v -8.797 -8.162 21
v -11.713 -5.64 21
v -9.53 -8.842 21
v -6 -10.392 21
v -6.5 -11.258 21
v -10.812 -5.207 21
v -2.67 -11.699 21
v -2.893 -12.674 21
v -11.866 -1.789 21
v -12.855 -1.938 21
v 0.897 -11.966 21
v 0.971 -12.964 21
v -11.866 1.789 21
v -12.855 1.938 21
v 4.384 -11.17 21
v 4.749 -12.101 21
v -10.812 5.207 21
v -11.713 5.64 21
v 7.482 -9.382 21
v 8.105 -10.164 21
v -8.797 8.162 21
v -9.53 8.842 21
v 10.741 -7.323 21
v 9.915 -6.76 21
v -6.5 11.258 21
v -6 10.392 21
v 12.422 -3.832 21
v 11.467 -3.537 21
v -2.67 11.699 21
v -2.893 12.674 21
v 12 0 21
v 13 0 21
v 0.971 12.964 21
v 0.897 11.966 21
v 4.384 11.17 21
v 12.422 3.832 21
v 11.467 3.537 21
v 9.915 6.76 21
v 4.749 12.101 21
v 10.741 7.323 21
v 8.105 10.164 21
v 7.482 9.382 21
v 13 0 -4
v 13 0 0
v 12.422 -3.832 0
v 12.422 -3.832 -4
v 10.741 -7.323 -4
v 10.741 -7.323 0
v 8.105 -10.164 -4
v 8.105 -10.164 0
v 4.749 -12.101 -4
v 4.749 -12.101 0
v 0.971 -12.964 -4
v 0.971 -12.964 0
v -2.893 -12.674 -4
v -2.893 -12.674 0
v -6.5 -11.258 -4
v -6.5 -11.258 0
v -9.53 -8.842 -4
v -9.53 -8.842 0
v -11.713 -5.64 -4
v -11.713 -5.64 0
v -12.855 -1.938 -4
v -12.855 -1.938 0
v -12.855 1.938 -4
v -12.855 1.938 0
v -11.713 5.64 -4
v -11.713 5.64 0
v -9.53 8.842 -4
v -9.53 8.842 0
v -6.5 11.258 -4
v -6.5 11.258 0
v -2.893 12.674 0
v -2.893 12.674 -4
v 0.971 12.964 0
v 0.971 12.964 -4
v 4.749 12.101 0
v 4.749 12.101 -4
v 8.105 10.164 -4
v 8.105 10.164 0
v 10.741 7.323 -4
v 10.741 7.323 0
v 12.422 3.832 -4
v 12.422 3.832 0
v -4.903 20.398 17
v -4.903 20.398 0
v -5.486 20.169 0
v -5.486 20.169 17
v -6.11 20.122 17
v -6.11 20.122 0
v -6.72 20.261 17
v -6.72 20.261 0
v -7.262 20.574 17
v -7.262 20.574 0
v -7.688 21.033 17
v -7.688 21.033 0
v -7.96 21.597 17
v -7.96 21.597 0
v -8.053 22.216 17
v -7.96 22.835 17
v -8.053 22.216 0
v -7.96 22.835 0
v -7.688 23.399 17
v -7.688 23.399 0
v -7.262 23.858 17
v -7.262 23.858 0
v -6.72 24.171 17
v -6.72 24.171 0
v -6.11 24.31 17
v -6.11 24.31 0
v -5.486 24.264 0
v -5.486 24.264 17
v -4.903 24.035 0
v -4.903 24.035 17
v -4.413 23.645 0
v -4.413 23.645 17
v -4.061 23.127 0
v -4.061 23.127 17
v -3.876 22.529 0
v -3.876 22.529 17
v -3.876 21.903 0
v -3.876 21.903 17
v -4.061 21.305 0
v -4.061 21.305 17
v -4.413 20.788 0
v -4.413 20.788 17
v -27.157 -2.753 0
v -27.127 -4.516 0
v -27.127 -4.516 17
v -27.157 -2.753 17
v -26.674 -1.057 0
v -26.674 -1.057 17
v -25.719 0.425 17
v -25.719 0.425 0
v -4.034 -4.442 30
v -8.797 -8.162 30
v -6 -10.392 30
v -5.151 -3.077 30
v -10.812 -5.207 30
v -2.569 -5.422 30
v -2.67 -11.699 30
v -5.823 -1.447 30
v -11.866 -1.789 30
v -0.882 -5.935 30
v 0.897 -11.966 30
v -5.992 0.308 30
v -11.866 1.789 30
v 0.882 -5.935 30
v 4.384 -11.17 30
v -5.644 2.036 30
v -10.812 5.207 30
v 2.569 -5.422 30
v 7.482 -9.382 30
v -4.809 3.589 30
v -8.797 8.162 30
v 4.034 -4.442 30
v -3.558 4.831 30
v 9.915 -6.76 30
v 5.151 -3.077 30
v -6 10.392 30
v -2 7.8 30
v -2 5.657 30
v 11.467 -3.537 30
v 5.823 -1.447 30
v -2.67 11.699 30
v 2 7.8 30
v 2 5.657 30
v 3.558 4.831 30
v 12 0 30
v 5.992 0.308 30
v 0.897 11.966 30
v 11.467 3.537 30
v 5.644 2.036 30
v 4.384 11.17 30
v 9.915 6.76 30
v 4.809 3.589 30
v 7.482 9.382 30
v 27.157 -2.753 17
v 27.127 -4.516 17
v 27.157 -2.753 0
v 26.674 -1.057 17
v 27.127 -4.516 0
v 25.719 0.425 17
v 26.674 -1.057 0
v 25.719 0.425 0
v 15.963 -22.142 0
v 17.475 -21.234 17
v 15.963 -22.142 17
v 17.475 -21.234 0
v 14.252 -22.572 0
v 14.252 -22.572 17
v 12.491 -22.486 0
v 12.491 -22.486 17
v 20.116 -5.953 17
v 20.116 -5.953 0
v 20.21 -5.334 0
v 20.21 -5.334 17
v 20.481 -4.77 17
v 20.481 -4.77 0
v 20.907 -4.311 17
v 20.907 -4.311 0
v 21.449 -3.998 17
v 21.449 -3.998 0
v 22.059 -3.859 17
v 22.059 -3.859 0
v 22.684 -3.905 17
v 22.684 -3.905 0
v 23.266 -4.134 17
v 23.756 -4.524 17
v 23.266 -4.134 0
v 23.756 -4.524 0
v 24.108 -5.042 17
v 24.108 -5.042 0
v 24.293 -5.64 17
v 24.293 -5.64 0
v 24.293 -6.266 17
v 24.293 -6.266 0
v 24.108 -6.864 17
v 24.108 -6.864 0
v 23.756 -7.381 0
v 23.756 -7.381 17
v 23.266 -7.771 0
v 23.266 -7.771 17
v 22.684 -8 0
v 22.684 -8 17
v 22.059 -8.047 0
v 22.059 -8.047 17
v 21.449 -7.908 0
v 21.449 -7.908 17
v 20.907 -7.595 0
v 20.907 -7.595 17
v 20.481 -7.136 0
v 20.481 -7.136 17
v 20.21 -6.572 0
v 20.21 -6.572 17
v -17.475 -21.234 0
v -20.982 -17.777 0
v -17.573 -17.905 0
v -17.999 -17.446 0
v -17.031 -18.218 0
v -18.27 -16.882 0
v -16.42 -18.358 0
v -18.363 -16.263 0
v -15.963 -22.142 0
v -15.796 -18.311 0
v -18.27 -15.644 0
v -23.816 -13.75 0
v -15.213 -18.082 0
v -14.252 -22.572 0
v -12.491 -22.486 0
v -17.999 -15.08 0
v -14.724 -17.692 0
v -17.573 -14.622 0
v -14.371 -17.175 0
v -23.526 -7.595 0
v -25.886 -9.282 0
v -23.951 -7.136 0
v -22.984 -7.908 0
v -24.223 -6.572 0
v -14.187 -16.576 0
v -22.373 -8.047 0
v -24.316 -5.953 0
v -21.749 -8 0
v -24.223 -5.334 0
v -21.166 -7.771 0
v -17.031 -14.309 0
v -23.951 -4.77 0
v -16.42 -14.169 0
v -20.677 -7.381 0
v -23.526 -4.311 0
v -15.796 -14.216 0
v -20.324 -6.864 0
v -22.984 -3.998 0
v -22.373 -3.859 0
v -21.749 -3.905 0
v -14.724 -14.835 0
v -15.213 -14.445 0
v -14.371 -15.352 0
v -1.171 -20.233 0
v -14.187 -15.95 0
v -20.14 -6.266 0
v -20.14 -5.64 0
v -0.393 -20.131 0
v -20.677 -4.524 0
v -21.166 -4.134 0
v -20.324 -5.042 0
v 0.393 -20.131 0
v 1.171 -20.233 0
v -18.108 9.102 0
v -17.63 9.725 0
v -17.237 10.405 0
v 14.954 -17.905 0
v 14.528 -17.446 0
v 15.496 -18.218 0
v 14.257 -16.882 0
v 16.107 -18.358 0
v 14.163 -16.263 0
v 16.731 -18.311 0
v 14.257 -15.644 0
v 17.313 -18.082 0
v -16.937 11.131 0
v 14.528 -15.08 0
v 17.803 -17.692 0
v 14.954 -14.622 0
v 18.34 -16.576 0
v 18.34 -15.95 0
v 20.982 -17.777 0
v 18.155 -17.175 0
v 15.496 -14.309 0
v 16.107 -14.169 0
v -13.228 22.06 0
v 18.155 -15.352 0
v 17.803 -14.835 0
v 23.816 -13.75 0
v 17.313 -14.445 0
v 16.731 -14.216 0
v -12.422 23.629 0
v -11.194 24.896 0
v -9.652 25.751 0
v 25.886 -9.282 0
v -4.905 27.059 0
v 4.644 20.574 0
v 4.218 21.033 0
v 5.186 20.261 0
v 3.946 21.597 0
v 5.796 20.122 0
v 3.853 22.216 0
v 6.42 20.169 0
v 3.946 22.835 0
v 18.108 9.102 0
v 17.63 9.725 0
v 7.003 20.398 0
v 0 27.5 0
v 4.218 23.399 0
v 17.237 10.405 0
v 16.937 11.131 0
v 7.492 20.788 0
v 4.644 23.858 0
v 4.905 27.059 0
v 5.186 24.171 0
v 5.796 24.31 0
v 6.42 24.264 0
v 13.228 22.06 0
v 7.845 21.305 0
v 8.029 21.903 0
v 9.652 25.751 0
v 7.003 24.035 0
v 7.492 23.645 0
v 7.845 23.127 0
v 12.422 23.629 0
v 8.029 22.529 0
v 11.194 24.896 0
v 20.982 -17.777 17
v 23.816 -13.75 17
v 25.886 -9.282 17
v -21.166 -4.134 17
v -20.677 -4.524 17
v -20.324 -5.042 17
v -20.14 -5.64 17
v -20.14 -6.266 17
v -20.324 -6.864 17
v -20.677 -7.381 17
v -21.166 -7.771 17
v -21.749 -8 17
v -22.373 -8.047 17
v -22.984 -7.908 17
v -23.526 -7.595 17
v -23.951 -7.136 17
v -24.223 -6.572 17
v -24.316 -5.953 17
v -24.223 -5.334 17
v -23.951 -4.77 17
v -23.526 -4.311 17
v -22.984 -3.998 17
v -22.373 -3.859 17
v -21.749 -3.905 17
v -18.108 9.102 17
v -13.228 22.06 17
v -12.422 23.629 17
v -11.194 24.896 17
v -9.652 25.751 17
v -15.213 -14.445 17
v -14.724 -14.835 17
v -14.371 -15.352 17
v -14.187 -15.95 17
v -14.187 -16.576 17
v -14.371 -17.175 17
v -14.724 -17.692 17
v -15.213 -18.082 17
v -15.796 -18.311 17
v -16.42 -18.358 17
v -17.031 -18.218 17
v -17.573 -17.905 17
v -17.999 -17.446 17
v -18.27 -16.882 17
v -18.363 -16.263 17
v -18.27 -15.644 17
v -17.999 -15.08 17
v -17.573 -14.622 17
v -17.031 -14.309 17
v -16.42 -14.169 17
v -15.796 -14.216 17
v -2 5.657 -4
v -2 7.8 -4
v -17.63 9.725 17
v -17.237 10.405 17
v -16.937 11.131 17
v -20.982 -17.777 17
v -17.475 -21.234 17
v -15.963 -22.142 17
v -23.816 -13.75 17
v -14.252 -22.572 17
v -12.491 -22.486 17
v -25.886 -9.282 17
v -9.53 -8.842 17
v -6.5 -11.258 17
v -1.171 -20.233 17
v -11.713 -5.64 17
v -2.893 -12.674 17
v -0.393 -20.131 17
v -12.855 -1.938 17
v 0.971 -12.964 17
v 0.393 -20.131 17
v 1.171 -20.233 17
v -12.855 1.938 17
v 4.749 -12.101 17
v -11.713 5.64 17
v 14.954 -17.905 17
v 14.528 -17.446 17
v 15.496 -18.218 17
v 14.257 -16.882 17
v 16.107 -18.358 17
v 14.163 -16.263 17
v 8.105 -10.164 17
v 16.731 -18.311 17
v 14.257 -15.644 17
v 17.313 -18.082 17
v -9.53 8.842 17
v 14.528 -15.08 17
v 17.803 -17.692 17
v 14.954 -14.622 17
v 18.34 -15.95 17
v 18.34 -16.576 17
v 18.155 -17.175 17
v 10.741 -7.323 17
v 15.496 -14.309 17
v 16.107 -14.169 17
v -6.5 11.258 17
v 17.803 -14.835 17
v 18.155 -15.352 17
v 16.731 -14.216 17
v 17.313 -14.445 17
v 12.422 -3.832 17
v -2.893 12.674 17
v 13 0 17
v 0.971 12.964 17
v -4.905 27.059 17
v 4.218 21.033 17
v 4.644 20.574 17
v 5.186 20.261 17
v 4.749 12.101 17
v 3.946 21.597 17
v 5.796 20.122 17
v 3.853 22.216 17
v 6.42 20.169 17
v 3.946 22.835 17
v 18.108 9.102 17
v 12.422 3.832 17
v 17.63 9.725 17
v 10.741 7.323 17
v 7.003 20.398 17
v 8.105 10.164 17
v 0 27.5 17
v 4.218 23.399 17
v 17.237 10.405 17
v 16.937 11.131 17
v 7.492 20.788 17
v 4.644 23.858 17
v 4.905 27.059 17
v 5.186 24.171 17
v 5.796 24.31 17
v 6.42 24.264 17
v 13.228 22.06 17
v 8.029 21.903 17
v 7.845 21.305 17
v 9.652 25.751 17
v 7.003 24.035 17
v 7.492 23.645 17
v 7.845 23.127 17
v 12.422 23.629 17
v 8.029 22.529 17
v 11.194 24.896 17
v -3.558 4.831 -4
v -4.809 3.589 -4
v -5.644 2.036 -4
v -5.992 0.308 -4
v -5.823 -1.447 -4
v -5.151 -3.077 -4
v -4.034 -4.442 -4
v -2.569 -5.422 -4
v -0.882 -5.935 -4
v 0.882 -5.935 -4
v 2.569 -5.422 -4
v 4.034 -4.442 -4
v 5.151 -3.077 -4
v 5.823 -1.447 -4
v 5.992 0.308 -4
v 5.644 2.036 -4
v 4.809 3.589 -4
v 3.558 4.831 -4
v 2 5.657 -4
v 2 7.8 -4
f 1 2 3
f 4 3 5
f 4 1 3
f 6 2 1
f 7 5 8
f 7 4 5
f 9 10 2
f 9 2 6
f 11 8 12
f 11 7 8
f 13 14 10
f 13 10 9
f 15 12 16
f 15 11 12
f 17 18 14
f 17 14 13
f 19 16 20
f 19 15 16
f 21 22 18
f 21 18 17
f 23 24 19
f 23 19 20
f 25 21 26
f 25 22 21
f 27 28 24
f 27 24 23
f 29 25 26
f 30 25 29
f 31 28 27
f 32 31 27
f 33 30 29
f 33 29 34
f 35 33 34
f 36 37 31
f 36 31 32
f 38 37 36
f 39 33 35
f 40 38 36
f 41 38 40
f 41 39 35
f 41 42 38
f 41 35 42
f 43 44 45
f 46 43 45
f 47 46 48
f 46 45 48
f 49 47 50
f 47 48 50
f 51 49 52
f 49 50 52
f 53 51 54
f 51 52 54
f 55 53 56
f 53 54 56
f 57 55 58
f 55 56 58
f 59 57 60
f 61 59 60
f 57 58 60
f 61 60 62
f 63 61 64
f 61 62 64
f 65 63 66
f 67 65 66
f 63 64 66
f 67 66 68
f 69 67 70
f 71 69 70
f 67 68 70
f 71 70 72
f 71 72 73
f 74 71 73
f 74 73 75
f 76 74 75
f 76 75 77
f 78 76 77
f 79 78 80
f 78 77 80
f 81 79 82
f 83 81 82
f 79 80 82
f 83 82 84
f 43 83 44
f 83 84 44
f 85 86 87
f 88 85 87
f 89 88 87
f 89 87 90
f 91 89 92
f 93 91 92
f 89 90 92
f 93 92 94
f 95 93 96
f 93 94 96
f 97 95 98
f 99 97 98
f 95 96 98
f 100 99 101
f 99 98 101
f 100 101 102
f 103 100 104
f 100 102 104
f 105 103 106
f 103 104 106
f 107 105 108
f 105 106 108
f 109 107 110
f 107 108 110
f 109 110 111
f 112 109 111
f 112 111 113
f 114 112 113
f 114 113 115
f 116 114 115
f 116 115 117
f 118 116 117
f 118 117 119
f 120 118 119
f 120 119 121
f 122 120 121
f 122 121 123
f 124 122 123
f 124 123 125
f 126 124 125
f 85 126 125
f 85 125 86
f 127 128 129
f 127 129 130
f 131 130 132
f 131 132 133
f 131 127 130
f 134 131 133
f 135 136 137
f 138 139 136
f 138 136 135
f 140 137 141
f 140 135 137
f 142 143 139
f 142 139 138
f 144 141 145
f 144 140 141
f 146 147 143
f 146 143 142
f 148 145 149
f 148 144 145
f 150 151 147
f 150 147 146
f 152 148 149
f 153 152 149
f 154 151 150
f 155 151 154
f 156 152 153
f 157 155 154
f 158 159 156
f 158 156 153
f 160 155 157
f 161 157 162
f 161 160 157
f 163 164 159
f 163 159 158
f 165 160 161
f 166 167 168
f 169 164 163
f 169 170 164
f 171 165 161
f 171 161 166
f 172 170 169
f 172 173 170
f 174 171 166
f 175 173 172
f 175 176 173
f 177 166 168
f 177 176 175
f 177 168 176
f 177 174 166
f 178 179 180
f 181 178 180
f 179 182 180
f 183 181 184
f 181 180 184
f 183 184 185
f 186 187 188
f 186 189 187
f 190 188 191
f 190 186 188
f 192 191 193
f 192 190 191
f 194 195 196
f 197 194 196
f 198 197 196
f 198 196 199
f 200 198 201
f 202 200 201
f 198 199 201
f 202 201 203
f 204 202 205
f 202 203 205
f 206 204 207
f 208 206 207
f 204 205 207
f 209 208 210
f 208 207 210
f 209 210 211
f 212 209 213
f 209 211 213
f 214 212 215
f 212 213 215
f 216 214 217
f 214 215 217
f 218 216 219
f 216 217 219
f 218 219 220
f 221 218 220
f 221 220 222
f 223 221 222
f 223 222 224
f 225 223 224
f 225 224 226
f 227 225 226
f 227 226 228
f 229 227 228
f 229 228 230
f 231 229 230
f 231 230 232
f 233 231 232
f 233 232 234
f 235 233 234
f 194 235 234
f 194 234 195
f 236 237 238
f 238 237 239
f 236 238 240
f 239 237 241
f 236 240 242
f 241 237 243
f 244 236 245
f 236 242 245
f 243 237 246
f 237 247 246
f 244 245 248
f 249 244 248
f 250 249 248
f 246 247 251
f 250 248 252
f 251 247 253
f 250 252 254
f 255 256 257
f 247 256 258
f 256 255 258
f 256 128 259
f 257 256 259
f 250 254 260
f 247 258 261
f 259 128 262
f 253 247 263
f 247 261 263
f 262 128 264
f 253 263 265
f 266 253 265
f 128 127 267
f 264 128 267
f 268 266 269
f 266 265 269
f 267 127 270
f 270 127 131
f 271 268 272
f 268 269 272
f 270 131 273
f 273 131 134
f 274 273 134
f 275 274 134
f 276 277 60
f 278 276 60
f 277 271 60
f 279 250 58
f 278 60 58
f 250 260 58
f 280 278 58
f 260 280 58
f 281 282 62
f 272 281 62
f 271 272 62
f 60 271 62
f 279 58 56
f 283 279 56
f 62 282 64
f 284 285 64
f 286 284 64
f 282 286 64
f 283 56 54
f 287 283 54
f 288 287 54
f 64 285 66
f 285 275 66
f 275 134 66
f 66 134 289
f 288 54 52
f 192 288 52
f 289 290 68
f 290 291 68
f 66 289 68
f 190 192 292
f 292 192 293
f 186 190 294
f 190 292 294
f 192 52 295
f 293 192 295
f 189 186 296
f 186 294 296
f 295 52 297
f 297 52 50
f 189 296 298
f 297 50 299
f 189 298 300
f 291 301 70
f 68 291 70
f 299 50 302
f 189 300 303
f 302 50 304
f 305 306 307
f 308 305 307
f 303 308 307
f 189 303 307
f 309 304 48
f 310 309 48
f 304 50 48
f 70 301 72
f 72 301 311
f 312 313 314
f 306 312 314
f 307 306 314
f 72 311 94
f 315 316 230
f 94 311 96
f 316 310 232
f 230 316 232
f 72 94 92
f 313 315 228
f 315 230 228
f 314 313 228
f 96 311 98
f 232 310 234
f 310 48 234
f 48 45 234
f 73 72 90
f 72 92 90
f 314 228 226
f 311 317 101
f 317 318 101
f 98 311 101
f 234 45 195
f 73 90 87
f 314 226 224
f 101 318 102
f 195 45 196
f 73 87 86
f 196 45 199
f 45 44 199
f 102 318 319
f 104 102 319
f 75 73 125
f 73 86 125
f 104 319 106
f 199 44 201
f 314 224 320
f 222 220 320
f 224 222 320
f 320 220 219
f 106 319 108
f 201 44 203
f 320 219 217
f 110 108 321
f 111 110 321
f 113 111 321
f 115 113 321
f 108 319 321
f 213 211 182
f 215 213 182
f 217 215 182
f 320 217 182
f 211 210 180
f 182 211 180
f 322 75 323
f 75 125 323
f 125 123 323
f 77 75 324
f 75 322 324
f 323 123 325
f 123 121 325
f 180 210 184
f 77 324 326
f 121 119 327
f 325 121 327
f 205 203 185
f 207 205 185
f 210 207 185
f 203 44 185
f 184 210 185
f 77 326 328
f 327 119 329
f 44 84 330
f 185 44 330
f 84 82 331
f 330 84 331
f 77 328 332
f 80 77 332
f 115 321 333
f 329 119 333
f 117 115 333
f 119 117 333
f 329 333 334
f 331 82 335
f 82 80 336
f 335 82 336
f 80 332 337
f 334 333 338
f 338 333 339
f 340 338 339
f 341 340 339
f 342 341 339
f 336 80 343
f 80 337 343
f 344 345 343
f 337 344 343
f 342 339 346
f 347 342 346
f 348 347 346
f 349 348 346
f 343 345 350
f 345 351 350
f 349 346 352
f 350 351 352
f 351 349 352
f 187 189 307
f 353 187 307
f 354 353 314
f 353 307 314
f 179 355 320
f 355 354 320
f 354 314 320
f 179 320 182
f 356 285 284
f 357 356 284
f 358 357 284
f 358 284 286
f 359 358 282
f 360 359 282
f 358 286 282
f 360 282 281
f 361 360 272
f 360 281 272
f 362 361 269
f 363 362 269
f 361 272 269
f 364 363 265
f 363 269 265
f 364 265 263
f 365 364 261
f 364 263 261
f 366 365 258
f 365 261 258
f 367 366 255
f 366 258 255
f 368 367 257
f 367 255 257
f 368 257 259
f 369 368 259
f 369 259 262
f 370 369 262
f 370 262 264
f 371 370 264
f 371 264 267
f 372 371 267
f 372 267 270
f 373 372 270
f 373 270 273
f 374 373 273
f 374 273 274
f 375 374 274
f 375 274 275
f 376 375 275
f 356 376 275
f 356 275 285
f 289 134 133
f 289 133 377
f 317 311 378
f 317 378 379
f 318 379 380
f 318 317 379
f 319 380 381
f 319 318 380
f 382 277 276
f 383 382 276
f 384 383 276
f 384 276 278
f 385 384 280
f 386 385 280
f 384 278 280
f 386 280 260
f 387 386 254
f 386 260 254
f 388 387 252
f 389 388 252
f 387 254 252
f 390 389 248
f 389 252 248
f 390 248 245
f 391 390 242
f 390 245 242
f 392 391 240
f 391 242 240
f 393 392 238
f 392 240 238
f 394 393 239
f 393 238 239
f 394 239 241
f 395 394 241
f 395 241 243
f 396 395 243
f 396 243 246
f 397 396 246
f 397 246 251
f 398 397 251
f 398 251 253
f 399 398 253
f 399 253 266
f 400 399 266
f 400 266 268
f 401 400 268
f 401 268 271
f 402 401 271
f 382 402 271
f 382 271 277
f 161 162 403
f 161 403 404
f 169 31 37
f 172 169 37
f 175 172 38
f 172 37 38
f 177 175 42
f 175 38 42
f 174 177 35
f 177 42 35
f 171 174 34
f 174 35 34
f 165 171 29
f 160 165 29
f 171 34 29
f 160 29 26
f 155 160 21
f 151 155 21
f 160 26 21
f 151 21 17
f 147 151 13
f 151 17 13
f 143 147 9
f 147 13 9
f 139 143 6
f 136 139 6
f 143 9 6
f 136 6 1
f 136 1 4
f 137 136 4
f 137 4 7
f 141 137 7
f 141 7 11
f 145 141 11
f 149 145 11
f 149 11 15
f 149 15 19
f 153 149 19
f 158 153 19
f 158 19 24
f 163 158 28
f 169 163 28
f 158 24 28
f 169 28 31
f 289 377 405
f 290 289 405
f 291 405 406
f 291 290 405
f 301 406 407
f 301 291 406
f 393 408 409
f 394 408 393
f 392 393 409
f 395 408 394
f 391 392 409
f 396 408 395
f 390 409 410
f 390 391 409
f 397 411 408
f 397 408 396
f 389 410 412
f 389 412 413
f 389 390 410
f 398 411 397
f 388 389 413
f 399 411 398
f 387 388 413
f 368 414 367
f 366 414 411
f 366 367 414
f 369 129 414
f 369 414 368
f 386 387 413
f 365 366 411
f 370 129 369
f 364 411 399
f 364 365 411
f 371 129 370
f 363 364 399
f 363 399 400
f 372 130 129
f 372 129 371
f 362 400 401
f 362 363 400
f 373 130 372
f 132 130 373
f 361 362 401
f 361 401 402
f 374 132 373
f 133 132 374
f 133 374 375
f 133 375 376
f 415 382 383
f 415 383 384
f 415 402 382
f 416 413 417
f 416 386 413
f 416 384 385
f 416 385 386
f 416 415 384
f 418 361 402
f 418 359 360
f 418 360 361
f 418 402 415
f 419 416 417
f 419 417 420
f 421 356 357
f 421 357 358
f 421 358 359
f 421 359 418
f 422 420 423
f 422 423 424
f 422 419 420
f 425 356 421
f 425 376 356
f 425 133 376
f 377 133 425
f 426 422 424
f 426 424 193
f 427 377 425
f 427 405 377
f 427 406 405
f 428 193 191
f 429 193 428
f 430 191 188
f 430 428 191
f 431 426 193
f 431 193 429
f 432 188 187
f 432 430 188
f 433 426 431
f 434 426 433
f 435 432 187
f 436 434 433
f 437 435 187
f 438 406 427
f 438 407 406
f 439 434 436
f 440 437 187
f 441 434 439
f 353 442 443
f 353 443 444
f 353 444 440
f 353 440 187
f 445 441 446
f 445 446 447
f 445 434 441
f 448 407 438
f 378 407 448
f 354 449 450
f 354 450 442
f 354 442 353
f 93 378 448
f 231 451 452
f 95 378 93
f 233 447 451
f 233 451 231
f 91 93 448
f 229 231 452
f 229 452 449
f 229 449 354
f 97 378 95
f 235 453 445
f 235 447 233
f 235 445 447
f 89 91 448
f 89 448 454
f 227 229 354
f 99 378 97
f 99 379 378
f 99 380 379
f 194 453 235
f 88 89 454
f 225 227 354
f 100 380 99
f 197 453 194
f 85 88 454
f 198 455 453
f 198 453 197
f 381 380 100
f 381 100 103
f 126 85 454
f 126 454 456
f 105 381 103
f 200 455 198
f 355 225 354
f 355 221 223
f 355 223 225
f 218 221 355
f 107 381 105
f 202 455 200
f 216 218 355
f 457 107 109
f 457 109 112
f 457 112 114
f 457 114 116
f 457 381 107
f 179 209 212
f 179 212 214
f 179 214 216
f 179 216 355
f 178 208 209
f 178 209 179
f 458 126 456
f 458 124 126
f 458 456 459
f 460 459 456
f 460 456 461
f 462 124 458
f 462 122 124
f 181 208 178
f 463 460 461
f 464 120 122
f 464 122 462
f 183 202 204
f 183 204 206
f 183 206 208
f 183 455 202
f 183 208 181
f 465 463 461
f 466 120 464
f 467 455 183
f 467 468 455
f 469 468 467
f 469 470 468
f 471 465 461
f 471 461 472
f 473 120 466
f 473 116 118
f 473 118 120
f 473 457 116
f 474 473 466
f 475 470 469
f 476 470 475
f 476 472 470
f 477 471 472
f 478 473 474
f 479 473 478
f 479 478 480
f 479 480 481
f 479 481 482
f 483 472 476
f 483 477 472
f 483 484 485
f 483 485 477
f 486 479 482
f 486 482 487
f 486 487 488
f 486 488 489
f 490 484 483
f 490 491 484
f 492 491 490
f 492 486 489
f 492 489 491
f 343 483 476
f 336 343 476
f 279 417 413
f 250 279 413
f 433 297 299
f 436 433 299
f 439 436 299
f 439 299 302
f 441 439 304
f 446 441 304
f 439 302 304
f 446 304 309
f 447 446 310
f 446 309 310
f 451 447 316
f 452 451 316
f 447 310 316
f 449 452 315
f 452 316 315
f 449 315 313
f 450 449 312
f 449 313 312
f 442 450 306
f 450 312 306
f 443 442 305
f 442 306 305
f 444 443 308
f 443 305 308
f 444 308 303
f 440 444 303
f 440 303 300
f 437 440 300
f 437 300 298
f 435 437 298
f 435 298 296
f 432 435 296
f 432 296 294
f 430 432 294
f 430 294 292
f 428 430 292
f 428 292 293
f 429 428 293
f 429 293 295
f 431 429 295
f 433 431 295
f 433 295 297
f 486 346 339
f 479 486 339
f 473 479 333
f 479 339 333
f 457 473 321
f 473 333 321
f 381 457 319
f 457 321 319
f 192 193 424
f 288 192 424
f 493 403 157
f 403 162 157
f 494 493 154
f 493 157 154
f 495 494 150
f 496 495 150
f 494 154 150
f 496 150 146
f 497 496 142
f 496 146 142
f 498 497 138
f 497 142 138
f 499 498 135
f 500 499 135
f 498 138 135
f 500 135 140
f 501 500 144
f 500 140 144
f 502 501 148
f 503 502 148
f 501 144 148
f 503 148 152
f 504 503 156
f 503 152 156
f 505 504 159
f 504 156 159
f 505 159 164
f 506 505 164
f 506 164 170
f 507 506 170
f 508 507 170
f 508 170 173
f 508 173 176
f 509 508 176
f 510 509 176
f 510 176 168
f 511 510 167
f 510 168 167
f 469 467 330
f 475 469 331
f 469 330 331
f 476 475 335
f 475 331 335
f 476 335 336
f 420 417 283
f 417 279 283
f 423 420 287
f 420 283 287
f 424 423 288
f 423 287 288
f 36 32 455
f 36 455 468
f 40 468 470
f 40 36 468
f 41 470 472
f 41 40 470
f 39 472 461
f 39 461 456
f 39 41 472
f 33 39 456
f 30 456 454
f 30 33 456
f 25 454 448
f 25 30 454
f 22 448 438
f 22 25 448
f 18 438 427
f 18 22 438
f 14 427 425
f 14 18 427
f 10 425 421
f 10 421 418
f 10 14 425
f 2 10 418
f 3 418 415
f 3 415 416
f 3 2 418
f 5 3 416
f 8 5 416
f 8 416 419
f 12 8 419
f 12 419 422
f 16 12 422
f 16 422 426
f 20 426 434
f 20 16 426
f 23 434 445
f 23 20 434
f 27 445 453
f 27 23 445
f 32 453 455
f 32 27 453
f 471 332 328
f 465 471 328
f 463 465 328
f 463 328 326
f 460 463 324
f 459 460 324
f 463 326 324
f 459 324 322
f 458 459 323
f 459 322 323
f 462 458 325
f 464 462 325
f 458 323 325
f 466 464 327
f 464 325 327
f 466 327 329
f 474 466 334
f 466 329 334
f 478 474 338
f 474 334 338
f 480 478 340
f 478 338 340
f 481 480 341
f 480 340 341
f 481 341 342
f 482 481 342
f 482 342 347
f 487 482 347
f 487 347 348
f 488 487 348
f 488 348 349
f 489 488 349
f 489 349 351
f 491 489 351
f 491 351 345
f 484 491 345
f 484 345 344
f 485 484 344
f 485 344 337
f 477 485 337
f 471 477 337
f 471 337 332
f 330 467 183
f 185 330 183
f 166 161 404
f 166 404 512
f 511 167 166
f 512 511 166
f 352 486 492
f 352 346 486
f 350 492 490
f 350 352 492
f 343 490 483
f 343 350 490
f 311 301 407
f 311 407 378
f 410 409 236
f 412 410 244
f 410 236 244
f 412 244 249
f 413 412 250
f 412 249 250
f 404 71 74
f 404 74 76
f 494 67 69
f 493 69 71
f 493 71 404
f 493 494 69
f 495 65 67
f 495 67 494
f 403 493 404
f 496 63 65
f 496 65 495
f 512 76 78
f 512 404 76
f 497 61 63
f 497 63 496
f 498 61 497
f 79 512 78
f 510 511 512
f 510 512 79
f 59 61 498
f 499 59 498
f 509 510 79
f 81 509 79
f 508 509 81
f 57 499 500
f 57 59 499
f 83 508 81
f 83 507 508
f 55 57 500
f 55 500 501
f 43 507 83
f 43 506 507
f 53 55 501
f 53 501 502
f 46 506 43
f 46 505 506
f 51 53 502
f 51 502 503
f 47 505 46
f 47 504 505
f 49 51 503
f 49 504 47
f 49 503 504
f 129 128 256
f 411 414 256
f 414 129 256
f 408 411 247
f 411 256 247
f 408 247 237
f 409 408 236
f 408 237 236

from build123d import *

# Parameters (mm, degrees)
SKETCH_1_R                       = 27.5
EXTRUDE_1_DEPTH                  = 17
SKETCH_2_R                       = 13
EXTRUDE_2_DEPTH                  = 4
EXTRUDE_START                    = 4
SKETCH_3_R                       = 13
EXTRUDE_3_DEPTH                  = 4
HOLE_WIZARD_M5_1_D               = 4.2
CUT_EXTRUDE_4_DEPTH              = 45.198416261
FILLET_1_R                       = 6
PATTERN_CIRCULAR_1_COUNT         = 2
PATTERN_CIRCULAR_1_ANGLE         = 120
FILLET_1_OF_PATTERN_CIRCULAR_1_R = 6
PATTERN_CIRCULAR_2_DEPTH         = 17
PATTERN_CIRCULAR_3_COUNT         = 3
SKETCH_15_R                      = 12
EXTRUDE_4_DEPTH                  = 9
SKETCH_16_R                      = 6
CUT_EXTRUDE_5_DEPTH              = 34
SKETCH_17_W                      = 4
SKETCH_17_H                      = 2.143145751
CUT_EXTRUDE_6_DEPTH              = 34


# Read off the part's stored shape, not the designer's step: 阵列(圆周)2
with BuildPart() as part:
    # 草图1 → 凸台-拉伸1 (new body)
    with BuildSketch(Plane.XY):
        Circle(SKETCH_1_R)
    extrude(amount=EXTRUDE_1_DEPTH)

    # 草图2 → 凸台-拉伸2 (add)
    with BuildSketch(Plane(origin=(0, 0, 0), x_dir=(-1, 0, 0), z_dir=(0, 0, -1))):
        with Locations(Location((0, 0, 0), (0, 0, 180))):
            Circle(SKETCH_2_R)
    extrude(amount=EXTRUDE_2_DEPTH)

    # 草图3 → 凸台-拉伸3 (add)
    with BuildSketch(Plane.XY.offset(17).offset(EXTRUDE_START)):
        Circle(SKETCH_3_R)
    extrude(amount=-EXTRUDE_3_DEPTH)

    # M5 螺纹孔1 (through all)
    with Locations(Plane(origin=(16.263455967, -16.263455967, 17), x_dir=(1, 0, 0), z_dir=(0, 0, 1))):
        with Locations((0, 0), (5.952838038, 10.31061793)):
            hole_wizard_m5_1 = Hole(HOLE_WIZARD_M5_1_D / 2)

    # 草图14 → 切除-拉伸4 (cut, through all)
    with BuildSketch(Plane.XY.offset(17)):
        Polygon((0, -23), (0, -20), (-15.074813432, -23), align=None)
        Polygon((15.074813432, -23), (0, -20), (0, -23), align=None)
        with BuildLine():
            Line((15.074813432, -23), (0, -23))
            Line((0, -23), (-15.074813432, -23))
            ThreePointArc((-15.074813432, -23), (0, -27.5), (15.074813432, -23))
        make_face()
    cut_extrude_4 = extrude(amount=-CUT_EXTRUDE_4_DEPTH, mode=Mode.SUBTRACT)

    # 圆角1
    fillet_1_edges = [part.edges().sort_by_distance(p)[0] for p in [
        (15.074813432, -23, 8.5),
        (-15.074813432, -23, 8.5),
        (0, -20, 8.5),
    ]]
    fillet(fillet_1_edges, radius=FILLET_1_R)

    # 阵列(圆周)1: 切除-拉伸4 ×2 about axis
    pattern_circular_1_axis = Axis((0, 0, 0), (0, 0, 1))
    for i in range(1, PATTERN_CIRCULAR_1_COUNT):
        add(cut_extrude_4.rotate(pattern_circular_1_axis, i * PATTERN_CIRCULAR_1_ANGLE / (PATTERN_CIRCULAR_1_COUNT - 1)), mode=Mode.SUBTRACT)

    # 圆角1 of 阵列(圆周)1
    fillet_1_of_pattern_circular_1_edges = [part.edges().sort_by_distance(p)[0] for p in [
        (12.381177571, 24.555171389, 8.5),
        (27.455991003, -1.555171389, 8.5),
        (17.320508076, 10, 8.5),
    ]]
    fillet(fillet_1_of_pattern_circular_1_edges, radius=FILLET_1_OF_PATTERN_CIRCULAR_1_R)

    # 阵列(圆周)2 outline → 阵列(圆周)2 (cut)
    with BuildSketch(Plane.XY):
        with BuildLine():
            Line((-16.936798412, 11.13071193), (-13.227796767, 22.060362126))
            ThreePointArc((-13.227796767, 22.060362126), (-11.854885653, 24.30763066), (-9.651911166, 25.750545836))
            ThreePointArc((-9.651911166, 25.750545836), (-23.815698604, 13.75), (-27.126582438, -4.516472653))
            ThreePointArc((-27.126582438, -4.516472653), (-26.978468484, -1.887183196), (-25.718732401, 0.425426973))
            Line((-25.718732401, 0.425426973), (-18.107878499, 9.102341718))
            ThreePointArc((-18.107878499, 9.102341718), (-17.422403117, 10.05882913), (-16.936798412, 11.13071193))
        make_face()
    extrude(amount=PATTERN_CIRCULAR_2_DEPTH, mode=Mode.SUBTRACT)

    # 阵列(圆周)3: M5 螺纹孔1 ×3 about axis
    pattern_circular_3_axis = Axis((0, 0, 0), (0, 0, 1))
    for i in range(1, PATTERN_CIRCULAR_3_COUNT):
        add(hole_wizard_m5_1.rotate(pattern_circular_3_axis, i * 360 / PATTERN_CIRCULAR_3_COUNT), mode=Mode.SUBTRACT)

    # 草图15 → 凸台-拉伸4 (add)
    with BuildSketch(Plane.XY.offset(21)):
        Circle(SKETCH_15_R)
    extrude(amount=EXTRUDE_4_DEPTH)

    # 草图16 → 切除-拉伸5 (cut)
    with BuildSketch(Plane.XY.offset(30)):
        Circle(SKETCH_16_R)
    extrude(amount=-CUT_EXTRUDE_5_DEPTH, mode=Mode.SUBTRACT)

    # 草图17 → 切除-拉伸6 (cut)
    with BuildSketch(Plane.XY.offset(30)):
        with Locations((0, 6.728427125)):
            Rectangle(SKETCH_17_W, SKETCH_17_H)
    extrude(amount=-CUT_EXTRUDE_6_DEPTH, mode=Mode.SUBTRACT)


solid = part.part
